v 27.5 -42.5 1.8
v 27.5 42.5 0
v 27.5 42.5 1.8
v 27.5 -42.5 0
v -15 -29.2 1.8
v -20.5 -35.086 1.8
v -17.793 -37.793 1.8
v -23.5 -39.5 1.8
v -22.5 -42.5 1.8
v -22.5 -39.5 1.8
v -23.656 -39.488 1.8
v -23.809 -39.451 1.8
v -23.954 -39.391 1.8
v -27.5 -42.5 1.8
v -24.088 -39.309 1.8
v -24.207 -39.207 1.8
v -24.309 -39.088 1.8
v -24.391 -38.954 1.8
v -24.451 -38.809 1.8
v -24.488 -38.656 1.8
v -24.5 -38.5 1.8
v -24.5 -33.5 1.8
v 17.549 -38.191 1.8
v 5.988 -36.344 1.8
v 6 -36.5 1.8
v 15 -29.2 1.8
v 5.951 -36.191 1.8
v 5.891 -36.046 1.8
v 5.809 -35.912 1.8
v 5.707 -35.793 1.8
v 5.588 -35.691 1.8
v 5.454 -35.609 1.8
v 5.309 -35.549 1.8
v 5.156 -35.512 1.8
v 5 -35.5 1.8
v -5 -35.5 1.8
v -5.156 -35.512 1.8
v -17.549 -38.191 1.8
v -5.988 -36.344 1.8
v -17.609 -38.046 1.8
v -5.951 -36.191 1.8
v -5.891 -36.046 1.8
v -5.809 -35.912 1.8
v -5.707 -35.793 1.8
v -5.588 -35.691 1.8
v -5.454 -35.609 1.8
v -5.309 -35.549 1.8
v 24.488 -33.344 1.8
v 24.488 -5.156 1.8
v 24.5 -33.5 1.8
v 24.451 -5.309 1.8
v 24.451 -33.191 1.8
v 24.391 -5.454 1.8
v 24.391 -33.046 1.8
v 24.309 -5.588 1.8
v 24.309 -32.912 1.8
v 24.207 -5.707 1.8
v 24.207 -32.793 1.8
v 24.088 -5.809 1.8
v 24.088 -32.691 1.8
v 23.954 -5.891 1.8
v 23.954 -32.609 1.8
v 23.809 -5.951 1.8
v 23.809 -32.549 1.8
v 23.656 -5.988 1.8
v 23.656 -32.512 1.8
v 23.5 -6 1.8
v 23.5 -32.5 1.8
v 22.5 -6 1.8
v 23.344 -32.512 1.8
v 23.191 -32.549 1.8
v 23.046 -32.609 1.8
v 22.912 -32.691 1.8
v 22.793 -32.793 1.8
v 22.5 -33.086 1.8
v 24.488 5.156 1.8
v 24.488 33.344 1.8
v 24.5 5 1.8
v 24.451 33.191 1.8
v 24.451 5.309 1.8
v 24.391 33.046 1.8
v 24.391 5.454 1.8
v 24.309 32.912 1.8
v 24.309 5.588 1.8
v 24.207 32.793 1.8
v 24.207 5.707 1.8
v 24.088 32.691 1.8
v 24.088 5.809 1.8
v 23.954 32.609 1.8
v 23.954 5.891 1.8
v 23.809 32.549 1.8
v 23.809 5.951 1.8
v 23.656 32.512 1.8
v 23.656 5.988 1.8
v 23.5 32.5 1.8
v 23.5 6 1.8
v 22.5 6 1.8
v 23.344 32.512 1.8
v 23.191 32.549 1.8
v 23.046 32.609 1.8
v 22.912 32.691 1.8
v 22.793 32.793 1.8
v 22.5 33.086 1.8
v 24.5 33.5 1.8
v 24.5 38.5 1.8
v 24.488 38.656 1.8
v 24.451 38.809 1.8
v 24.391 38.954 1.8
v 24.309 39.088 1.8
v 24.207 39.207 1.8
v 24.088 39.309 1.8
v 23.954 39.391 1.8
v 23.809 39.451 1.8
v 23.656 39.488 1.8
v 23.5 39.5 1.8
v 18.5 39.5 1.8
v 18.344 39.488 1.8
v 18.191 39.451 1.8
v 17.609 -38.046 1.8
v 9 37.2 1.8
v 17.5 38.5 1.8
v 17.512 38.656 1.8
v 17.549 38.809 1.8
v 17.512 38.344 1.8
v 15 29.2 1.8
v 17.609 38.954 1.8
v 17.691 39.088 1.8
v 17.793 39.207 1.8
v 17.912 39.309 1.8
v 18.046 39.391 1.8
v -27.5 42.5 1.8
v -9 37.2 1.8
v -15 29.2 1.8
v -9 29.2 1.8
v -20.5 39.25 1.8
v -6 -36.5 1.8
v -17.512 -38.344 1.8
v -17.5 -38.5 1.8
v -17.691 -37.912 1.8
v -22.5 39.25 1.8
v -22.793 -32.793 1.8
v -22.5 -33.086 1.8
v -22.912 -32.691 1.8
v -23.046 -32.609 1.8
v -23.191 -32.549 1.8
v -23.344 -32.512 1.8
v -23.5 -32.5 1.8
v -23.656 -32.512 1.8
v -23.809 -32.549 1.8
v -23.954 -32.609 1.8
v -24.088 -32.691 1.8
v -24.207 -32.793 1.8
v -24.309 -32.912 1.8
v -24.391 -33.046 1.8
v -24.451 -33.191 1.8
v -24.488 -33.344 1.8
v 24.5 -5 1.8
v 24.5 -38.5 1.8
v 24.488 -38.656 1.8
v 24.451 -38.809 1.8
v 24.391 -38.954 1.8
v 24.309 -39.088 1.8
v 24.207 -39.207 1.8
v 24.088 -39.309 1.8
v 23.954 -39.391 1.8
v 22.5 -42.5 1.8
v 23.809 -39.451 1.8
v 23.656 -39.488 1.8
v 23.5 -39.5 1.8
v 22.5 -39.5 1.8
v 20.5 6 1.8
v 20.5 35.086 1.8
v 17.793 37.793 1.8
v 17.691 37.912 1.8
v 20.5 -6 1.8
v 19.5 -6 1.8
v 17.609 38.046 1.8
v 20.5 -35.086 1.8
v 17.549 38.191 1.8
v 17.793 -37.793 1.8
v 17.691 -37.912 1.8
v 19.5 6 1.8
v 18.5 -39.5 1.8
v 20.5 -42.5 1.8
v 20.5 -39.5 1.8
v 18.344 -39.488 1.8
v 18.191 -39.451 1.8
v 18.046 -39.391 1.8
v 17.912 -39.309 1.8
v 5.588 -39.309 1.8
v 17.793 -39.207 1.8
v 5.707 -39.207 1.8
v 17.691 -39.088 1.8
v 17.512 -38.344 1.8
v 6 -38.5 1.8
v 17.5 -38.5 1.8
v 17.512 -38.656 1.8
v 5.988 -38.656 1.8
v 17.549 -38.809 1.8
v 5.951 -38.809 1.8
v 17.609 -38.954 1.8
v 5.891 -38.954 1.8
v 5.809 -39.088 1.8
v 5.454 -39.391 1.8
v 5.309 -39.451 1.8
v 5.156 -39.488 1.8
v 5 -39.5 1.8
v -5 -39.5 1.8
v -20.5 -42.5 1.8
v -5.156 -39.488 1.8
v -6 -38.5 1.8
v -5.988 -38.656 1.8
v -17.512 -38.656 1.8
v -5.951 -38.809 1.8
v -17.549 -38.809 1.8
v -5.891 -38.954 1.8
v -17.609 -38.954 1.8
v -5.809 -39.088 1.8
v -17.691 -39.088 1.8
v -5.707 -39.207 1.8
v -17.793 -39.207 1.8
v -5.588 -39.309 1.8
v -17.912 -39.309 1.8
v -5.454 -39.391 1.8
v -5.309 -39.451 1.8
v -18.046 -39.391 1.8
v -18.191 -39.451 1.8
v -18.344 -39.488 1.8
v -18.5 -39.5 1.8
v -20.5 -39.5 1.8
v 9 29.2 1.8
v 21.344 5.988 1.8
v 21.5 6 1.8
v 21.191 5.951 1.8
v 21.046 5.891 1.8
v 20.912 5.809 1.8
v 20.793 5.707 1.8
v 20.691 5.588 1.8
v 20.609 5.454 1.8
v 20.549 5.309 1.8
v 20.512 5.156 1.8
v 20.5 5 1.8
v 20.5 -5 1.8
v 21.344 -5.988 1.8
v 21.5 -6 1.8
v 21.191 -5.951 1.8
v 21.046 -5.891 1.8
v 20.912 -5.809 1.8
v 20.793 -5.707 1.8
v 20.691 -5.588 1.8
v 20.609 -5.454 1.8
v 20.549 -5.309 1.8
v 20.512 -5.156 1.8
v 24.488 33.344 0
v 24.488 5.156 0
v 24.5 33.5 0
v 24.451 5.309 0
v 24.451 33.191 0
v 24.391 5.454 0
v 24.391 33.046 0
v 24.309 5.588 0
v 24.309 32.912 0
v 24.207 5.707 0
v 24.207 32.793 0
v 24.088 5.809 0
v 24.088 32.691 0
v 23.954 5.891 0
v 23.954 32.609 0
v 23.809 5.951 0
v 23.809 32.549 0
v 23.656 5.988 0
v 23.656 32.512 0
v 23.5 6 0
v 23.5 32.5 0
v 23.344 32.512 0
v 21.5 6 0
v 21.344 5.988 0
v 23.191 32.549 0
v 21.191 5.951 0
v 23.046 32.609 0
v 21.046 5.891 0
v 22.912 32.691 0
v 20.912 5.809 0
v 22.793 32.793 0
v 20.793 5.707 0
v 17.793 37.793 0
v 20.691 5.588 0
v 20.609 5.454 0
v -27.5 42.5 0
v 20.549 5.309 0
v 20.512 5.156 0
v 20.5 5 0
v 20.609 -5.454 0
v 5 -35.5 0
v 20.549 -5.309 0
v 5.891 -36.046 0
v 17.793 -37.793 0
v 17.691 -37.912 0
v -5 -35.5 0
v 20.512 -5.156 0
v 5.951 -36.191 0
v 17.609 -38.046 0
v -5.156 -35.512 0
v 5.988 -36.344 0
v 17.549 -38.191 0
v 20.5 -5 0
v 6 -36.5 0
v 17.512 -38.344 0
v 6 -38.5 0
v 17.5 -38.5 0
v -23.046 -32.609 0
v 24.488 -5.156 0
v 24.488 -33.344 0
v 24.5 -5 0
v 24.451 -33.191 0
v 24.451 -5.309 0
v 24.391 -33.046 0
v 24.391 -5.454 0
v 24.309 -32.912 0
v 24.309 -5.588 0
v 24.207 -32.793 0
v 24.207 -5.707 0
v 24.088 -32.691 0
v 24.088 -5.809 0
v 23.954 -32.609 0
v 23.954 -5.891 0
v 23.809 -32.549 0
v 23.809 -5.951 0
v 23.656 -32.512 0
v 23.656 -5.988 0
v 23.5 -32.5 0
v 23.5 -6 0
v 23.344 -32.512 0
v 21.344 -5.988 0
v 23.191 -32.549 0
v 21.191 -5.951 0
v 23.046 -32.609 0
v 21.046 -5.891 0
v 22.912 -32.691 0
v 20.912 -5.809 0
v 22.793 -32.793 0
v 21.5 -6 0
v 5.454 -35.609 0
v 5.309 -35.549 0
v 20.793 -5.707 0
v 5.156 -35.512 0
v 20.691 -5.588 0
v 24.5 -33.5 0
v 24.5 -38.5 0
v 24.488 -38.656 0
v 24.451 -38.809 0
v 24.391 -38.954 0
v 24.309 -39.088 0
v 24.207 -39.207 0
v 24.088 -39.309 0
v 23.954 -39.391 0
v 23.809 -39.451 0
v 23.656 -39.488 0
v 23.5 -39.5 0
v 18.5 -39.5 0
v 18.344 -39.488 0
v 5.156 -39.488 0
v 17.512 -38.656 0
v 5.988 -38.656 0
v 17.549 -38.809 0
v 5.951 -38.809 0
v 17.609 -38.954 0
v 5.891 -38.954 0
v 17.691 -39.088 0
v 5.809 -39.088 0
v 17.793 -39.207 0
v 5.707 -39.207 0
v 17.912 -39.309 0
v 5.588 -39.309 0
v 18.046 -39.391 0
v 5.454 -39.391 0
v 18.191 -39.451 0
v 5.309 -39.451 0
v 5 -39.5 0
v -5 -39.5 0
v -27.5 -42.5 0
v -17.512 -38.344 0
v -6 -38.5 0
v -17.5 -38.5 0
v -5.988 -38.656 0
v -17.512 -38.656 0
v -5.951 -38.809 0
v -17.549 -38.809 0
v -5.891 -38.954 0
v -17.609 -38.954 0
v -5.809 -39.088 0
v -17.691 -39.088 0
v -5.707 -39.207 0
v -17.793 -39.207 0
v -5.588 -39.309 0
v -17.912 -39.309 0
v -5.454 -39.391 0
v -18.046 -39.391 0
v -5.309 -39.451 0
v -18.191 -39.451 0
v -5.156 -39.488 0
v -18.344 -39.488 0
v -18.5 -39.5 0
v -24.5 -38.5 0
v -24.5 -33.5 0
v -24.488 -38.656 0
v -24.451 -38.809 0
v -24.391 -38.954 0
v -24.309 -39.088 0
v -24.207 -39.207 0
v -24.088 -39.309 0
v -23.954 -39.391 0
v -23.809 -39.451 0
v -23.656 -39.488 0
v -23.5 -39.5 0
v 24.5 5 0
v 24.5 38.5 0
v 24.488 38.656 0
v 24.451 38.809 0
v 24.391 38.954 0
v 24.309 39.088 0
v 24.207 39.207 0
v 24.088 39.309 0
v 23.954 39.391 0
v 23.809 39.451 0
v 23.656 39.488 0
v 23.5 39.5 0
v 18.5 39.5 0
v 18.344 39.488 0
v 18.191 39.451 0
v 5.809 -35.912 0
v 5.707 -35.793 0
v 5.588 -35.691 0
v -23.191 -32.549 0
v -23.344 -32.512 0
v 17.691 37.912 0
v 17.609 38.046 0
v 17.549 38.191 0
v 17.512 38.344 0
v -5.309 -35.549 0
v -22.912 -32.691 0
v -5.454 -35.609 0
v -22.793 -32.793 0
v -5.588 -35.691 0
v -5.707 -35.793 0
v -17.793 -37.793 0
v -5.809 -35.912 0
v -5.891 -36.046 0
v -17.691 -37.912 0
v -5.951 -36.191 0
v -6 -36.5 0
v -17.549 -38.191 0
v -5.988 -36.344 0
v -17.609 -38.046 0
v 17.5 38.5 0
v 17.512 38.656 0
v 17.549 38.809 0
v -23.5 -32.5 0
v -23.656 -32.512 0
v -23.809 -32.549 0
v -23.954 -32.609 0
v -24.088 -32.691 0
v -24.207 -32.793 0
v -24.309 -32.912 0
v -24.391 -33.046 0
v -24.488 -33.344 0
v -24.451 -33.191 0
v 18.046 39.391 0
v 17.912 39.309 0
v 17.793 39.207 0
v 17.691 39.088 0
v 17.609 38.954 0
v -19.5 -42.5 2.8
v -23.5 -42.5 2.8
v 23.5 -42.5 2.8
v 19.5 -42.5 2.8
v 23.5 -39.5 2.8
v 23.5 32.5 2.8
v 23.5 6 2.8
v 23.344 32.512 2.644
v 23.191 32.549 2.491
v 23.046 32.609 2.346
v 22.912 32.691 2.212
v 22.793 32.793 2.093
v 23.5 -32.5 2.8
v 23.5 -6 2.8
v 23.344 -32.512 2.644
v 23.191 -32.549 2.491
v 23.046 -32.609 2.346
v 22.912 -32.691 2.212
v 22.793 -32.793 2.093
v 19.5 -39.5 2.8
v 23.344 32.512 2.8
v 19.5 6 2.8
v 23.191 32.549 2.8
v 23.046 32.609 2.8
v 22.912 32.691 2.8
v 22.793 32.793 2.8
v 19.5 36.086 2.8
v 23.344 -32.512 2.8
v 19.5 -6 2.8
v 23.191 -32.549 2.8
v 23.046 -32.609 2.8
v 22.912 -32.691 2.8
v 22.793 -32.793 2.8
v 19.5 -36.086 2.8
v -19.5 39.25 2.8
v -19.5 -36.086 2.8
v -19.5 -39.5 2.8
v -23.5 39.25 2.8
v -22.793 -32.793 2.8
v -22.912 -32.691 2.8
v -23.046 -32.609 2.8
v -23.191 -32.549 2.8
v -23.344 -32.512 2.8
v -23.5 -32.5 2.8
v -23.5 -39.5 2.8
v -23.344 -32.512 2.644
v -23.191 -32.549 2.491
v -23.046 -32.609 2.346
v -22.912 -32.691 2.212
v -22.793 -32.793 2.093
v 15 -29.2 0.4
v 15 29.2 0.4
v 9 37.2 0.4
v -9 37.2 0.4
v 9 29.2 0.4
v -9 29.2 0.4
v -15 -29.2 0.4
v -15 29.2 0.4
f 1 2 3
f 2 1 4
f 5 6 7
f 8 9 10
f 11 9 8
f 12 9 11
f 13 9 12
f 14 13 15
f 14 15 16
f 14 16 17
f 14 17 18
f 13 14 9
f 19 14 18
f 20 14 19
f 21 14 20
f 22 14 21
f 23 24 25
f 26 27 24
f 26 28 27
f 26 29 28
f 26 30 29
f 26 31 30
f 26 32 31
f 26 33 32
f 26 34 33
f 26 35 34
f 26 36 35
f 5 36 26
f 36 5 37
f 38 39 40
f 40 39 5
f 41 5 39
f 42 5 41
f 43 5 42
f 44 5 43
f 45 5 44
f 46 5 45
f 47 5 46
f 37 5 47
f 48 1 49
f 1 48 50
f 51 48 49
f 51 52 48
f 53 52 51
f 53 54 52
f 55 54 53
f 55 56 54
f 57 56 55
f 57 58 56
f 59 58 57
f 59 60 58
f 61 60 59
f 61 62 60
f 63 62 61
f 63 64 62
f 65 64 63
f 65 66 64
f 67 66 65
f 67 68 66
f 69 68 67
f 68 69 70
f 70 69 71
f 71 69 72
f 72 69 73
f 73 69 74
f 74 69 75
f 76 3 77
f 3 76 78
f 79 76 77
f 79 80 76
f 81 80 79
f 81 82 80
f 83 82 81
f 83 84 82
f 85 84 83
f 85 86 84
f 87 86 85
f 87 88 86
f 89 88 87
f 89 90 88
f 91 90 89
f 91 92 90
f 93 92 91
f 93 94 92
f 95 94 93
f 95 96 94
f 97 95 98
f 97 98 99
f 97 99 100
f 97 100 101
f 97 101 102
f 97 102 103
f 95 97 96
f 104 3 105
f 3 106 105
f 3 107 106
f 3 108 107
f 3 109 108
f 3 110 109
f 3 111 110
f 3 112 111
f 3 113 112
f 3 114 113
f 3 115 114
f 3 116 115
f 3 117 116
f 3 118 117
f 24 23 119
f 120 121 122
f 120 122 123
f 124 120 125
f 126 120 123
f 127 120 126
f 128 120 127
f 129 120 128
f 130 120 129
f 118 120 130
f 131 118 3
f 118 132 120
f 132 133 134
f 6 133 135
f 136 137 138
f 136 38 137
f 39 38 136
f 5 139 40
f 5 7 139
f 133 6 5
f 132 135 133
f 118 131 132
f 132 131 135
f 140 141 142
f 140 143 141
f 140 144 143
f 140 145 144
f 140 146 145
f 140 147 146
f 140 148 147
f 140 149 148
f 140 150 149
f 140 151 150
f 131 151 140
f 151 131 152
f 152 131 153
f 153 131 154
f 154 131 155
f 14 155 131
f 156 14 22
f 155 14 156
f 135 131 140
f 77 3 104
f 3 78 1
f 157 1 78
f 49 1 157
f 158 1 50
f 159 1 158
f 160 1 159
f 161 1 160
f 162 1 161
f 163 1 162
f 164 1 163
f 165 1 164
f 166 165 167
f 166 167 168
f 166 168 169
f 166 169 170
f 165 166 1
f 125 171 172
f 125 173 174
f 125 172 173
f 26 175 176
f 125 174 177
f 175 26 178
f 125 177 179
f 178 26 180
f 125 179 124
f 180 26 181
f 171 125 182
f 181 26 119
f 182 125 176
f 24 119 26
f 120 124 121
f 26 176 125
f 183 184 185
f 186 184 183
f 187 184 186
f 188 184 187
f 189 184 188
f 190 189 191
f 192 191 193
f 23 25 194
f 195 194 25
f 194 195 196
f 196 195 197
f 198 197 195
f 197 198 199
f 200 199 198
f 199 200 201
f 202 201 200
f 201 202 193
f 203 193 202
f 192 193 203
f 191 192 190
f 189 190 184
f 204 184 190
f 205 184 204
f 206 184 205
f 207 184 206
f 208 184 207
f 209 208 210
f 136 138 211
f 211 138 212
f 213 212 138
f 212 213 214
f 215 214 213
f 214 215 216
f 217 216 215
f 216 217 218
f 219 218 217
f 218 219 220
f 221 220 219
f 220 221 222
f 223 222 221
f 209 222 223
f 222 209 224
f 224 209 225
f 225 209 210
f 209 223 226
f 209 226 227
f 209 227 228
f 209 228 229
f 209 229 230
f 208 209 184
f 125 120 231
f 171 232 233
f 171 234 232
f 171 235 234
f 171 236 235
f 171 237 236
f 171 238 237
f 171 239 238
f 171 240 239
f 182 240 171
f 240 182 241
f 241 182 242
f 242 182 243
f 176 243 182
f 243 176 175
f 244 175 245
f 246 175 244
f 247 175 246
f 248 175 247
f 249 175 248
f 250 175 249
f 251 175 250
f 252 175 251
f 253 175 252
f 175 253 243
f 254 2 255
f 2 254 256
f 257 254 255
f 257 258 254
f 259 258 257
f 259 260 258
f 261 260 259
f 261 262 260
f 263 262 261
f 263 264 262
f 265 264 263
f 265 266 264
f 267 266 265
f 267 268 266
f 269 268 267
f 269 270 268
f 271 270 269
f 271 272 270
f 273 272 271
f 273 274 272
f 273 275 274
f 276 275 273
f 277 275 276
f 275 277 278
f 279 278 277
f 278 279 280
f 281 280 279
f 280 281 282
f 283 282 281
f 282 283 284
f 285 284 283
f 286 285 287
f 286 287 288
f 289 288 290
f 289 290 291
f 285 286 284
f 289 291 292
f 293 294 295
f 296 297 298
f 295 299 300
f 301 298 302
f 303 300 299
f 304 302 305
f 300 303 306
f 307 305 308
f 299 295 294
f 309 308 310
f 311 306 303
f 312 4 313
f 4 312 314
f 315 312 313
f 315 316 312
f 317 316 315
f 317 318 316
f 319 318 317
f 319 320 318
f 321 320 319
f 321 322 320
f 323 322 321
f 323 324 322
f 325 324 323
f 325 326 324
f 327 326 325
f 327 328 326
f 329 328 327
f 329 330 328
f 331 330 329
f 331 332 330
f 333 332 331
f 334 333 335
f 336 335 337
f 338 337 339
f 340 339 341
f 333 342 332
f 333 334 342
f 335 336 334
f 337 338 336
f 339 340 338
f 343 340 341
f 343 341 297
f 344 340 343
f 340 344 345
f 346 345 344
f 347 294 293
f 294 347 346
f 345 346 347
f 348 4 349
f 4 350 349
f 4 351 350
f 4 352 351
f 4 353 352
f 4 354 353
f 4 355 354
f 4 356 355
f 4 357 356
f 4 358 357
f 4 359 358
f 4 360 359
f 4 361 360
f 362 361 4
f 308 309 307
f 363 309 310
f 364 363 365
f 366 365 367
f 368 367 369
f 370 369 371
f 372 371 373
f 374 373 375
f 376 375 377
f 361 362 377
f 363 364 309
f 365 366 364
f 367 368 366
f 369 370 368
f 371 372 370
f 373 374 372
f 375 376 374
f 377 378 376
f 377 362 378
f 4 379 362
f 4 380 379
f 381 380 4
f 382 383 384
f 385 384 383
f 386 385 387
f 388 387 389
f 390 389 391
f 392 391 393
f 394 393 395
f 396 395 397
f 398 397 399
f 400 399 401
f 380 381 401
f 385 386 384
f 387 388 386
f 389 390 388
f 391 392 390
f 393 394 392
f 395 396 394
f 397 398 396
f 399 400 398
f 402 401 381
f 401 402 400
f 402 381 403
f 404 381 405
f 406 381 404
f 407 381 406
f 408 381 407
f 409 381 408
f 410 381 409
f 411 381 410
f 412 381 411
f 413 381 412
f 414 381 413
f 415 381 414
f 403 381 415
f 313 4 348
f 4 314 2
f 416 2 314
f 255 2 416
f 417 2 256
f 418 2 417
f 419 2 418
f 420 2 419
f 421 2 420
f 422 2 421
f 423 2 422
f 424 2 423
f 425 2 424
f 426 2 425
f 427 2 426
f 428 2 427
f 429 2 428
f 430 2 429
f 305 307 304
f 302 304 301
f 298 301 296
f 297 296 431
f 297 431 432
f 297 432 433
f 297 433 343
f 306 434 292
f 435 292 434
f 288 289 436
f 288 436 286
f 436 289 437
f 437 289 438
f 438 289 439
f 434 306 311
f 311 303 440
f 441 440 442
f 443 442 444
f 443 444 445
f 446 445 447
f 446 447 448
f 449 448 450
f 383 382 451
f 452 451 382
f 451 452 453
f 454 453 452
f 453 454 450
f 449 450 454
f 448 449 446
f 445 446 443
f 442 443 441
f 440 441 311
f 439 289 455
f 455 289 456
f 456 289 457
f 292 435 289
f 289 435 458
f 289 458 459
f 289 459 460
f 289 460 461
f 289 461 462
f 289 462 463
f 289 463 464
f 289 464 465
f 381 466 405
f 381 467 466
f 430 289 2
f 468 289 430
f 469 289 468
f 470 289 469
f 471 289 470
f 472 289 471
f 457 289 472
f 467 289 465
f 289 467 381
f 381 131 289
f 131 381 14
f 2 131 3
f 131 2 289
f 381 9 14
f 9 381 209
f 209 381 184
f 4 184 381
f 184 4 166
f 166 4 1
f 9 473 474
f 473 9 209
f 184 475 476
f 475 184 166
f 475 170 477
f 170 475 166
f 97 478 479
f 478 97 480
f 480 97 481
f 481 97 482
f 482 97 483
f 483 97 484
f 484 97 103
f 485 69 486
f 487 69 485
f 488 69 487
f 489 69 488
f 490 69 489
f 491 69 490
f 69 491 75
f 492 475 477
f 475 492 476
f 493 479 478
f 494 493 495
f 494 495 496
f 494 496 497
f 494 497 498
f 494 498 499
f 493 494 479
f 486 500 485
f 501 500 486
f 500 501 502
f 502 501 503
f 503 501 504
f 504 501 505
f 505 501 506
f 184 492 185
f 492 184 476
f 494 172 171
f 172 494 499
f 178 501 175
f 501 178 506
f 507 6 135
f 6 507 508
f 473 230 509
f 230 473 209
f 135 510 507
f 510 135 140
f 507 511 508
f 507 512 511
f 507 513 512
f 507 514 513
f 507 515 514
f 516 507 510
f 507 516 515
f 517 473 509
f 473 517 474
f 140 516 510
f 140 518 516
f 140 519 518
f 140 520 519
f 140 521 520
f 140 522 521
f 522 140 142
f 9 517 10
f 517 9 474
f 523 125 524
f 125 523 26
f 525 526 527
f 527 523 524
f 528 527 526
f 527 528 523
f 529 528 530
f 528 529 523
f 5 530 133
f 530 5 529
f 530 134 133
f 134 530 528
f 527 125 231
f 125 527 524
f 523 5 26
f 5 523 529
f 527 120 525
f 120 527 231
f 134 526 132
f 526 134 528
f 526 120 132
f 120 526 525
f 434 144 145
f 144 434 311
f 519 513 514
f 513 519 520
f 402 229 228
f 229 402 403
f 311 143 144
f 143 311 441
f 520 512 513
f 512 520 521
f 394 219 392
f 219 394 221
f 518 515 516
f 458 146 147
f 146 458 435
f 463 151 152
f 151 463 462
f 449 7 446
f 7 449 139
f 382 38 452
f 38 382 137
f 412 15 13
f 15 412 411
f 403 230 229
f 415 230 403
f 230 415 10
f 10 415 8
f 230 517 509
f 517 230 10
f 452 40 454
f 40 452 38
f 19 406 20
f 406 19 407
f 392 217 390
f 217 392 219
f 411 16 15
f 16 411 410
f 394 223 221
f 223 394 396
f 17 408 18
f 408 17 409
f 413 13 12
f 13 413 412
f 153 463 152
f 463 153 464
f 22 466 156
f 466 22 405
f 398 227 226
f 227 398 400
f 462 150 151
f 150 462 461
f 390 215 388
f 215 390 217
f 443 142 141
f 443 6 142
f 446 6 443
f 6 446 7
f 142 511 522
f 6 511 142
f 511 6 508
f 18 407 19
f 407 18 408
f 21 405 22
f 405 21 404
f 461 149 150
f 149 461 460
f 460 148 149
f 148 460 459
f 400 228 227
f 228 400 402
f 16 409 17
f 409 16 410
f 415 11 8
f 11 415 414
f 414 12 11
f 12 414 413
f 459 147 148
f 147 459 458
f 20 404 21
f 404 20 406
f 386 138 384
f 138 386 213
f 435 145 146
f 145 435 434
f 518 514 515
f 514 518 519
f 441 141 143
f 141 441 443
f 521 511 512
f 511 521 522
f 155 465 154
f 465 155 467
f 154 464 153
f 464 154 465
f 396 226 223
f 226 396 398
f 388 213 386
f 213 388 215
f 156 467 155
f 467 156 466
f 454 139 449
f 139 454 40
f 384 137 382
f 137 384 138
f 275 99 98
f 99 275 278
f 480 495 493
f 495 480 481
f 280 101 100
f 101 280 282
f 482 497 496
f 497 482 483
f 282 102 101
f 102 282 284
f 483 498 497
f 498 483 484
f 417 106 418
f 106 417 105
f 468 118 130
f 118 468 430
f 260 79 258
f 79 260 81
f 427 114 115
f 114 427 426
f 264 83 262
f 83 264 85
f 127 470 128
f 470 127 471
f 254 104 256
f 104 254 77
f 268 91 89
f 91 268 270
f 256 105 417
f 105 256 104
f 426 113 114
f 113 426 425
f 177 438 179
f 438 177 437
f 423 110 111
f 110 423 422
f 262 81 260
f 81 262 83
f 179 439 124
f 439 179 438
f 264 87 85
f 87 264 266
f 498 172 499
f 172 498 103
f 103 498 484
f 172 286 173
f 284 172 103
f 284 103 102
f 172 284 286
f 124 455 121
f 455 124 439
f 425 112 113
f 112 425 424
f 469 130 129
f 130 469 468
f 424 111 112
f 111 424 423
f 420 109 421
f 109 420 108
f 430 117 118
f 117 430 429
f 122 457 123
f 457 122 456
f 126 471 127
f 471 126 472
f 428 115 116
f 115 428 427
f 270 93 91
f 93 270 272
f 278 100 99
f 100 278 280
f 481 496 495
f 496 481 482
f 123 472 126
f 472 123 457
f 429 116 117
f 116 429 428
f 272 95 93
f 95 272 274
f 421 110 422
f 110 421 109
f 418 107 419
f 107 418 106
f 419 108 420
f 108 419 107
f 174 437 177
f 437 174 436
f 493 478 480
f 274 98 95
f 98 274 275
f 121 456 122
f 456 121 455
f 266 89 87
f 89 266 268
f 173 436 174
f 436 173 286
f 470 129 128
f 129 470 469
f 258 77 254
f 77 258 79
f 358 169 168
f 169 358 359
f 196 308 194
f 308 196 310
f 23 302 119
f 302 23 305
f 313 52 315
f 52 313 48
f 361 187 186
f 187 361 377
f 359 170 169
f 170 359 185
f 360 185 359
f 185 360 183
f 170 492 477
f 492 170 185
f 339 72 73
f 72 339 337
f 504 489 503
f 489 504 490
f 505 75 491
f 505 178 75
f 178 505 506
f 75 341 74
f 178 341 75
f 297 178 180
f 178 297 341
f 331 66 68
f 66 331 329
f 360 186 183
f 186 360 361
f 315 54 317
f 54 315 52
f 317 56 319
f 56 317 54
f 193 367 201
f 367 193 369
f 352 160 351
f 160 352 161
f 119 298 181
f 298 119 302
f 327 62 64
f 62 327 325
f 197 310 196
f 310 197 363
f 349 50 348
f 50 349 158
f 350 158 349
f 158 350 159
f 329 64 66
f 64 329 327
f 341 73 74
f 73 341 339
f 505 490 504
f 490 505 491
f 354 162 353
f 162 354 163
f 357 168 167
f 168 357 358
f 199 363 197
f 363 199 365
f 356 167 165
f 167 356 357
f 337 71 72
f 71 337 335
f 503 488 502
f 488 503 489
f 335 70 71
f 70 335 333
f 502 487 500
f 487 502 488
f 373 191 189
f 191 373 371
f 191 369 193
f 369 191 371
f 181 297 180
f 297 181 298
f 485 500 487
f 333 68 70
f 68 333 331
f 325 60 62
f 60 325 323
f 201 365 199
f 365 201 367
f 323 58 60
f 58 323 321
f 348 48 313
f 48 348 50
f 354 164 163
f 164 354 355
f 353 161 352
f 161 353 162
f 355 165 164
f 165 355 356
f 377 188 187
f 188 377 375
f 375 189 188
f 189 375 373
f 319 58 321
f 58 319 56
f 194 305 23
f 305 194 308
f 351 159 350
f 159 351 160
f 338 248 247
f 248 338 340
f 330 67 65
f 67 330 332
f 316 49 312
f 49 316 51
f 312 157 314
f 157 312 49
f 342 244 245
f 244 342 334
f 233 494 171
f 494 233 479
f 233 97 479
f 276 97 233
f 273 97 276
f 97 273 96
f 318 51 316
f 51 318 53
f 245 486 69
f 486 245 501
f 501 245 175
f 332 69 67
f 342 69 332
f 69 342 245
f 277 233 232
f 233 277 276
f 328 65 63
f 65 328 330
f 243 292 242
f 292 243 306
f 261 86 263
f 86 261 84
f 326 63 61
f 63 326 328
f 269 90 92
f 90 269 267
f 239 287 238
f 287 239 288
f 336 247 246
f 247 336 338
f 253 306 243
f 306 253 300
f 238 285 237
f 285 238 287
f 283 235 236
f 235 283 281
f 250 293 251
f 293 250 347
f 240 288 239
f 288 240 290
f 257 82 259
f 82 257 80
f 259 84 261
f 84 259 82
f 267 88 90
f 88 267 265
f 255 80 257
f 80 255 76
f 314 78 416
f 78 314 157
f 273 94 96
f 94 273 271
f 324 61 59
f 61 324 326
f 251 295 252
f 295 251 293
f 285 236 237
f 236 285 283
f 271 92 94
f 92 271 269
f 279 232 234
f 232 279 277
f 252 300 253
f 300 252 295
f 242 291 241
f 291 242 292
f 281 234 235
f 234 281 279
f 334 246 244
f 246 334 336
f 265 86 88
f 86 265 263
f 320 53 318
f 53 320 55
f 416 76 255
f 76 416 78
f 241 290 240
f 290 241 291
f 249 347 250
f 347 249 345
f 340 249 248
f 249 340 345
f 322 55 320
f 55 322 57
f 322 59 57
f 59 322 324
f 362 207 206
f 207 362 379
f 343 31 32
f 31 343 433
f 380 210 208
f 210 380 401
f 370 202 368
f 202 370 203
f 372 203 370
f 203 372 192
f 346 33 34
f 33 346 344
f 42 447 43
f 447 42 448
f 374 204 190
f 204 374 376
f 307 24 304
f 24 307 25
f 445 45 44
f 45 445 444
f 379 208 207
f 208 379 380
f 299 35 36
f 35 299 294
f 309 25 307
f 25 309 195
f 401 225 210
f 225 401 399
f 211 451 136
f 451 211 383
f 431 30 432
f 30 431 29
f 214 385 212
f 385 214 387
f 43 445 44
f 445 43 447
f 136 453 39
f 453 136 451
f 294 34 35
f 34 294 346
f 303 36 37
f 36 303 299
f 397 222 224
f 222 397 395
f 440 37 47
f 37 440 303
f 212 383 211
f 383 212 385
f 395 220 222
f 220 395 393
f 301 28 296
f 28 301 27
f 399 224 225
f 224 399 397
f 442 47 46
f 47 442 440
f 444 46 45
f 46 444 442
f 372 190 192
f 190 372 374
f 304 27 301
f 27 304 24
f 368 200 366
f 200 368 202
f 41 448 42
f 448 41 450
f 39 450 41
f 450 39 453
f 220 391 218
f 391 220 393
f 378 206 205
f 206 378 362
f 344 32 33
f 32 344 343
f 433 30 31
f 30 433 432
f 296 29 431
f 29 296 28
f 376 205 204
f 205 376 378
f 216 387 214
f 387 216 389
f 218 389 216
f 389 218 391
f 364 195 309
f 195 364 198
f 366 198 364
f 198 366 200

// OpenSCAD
// file: common.scad
/*
 * Maker Badge - created for Maker Faire Salzburg 2026
 * Copyright (c) 2026 Mihai T. 
 *
 * Description:
 *    Educational Arduino project - e-Ink (ePaper) badge for Maker Faire, usable as digital business card. 
 *
 *
 * SPDX-License-Identifier: MIT
 * See LICENSE file in the project root for full license text.
 *
 */


$fa = 1;
$fs = 0.4;


// dimensions for MakerBadge
base_L = 85;
base_W = 55;
base_T = 3;
corner_R = 3;

top_L = 85;
top_W = 55;
top_T = 2;
btm_L = 85;
btm_W = 55;
btm_T = 1.8;

// eInk display dimensions, rounded up to next integer; display type E2206xxx
eInk_L = 30;
eInk_W = 58.4;
eInk_T = 1.4;
fpc_W = 18;
fpc_L = 8;
fpc_T = eInk_T;
//eInk_view_L = 24;
//eInk_view_W = 47;
eInk_view_L = 24 + 1.2;   // add +1.2mm extra space around the viewing area; this is 0.6 on each side!
eInk_view_W = 47 + 1.2;

font_H = 6;
fontSmall_H = 5;
font_extr = 0.4;

//glass_L = eInk_view_L+10;       // larger than view window!!!
//glass_W = eInk_view_W+10;
glass_L = eInk_view_L -1.2 + 10;       // larger than view window!!! -1.2mm to compensate for extra space around viewing area
glass_W = eInk_view_W -1.2 + 10;
glass_T = 1;


// #################  dove tail lock ######################
card_l = 85;   // length = sliding direction (Y)
card_w = 55;   // width (X)
t      = 2;    // plate thickness
rail_h = 1;    // dovetail height (must be less than t)
neck_w = 2;   // rail width at its narrow base
angle  = 45;   // flank angle from vertical (keep <= 45 for support-free printing)
//clr    = 0.2;  // clearance per side: 0.15 - 0.25 is typical, tune to your printer
clr    = 0.25; // clearance per side: 0.15 - 0.25 is typical, tune to your printer
wall   = 3;    // closed end of the groove = stop, so B ends up flush when closed

$fn = 40;

// Trapezoid cross-section: narrow at the base, wider at the tip
module profile() {
    tip = neck_w + 2 * rail_h * tan(angle);
    polygon([[-neck_w/2, 0], [neck_w/2, 0], [tip/2, rail_h], [-tip/2, rail_h]]);
}

// Profile extruded along +Y from y0 to y0+len, standing on z=0 and pointing up.
// grow > 0 enlarges the profile evenly (used for the groove clearance).
module dovetail(y0, len, grow = 0) {
    translate([0, y0 + len, 0]) rotate([90, 0, 0])
        linear_extrude(height = len) offset(delta = grow) profile();
}


// #################  dove tail lock ######################
// file: BOSL2/gears.scad
// gears.scad - GPL-3.0
module gear() cylinder(h = 1, r = 2);
// file: BOSL2/std.scad
// Minimal BOSL2 compatibility shim for bundled gallery models.
// It implements only the helpers used by the imported OpenSCAD projects.

CENTER = [0, 0, 0];
BOTTOM = [0, 0, -1];
TOP = [0, 0, 1];
LEFT = [-1, 0, 0];
RIGHT = [1, 0, 0];
FRONT = [0, -1, 0];
BACK = [0, 1, 0];

module up(z=0) {
    translate([0, 0, z]) children();
}

module down(z=0) {
    translate([0, 0, -z]) children();
}

module attach(anchor=CENTER) {
    children();
}

module cuboid(size=[1, 1, 1], anchor=CENTER) {
    center = anchor == CENTER;
    translate(center ? [0, 0, 0] : [0, 0, size[2] / 2])
        cube(size, center=true);
    children();
}

module xcyl(h=1, r=1, anchor=CENTER) {
    center = anchor == CENTER;
    translate(center ? [0, 0, 0] : [h / 2, 0, 0])
        rotate([0, 90, 0])
            cylinder(h=h, r=r, center=true);
}
// main file
/*
 * Maker Badge - created for Maker Faire Salzburg 2026
 * Copyright (c) 2026 Mihai T. 
 *
 * Description:
 *    Educational Arduino project - e-Ink (ePaper) badge for Maker Faire, usable as digital business card. 
 *
 *
 * SPDX-License-Identifier: MIT
 * See LICENSE file in the project root for full license text.
 *
 */


use <MCAD/boxes.scad>
include <BOSL2/std.scad>
include <BOSL2/gears.scad>

include <common.scad>


// top part - includes glass, slide into the base
// bottom - 2 layers: 0.4mm + glass 1mm + 3 layers on top 0.6mm = 2mm
// lower part: 2 layers bottom 0.4mm + 1.4mm display = 1.8mm
// total = 3.8mm thick
difference() {
  // back plate + dove tail rails
  union() {
      translate([0, 0, btm_T/2])    
      cuboid([btm_W, btm_L, btm_T], rounding=1.79,
        edges=[BOTTOM+FRONT, BOTTOM+RIGHT, BOTTOM+BACK, BOTTOM+LEFT, FRONT+LEFT, FRONT+RIGHT, BACK+LEFT, BACK+RIGHT]);

      // dove tail lock
      translate([top_W/2 - 6, 0, btm_T])
        dovetail(-top_L/2, top_L - wall - clr);
      translate([-top_W/2 + 6, 0, btm_T])
        dovetail(-top_L/2, top_L - wall - clr);
  }

  // the cutout for the display
  translate([0, 0, btm_T - eInk_T/2])
    union() {
        cube([eInk_L, eInk_W, eInk_T], center = true);
        translate([0, eInk_W/2 + fpc_L/2, 0])
            cube([fpc_W, fpc_L, fpc_T], center = true);
    }
       

  // corner cutouts for hanging; extra +1 comes from offset +1
  translate([-top_W/2 + 3 + 1, -top_L/2 + 3 + 1, top_T/2])    
   linear_extrude(height = top_T + 10, center = true, convexity = 10, twist = 0)
    offset(r=+1)
      polygon([[0,0],[5,0],[0,5]]);

  translate([top_W/2 - 3 - 1, top_L/2 - 3 - 1, top_T/2])    
   linear_extrude(height = top_T + 10, center = true, convexity = 10, twist = 0)
    offset(r=+1)
      polygon([[0,0],[-5,0],[0,-5]]);

  translate([top_W/2 - 3 - 1, -top_L/2 + 3 + 1, top_T/2])    
   linear_extrude(height = top_T + 10, center = true, convexity = 10, twist = 0)
    offset(r=+1)
      polygon([[0,0],[-5,0],[0,5]]);

  // single hanging hole on long edge
  translate([top_W/2 - 3 -2 -1, -10/2, top_T/2])
  linear_extrude(height = top_T + 10, center = true, convexity = 10, twist = 0)
  offset(r=+1)
  polygon([[0,0],[2,0],[2,10],[0,10]]);
  // cut out the thin rail rest on the side of the hole
  translate([top_W/2 - 3 -2 -1, 0, btm_T + 2/2])
  cube([4, 12, 2], center = true);
  
  // on short edge
  translate([-10/2, -top_L/2 + 3 +2 -1, top_T/2])
  linear_extrude(height = top_T + 10, center = true, convexity = 10, twist = 0)
  offset(r=+1)
  polygon([[0,0],[10,0],[10,2],[0,2]]);  
  
}
